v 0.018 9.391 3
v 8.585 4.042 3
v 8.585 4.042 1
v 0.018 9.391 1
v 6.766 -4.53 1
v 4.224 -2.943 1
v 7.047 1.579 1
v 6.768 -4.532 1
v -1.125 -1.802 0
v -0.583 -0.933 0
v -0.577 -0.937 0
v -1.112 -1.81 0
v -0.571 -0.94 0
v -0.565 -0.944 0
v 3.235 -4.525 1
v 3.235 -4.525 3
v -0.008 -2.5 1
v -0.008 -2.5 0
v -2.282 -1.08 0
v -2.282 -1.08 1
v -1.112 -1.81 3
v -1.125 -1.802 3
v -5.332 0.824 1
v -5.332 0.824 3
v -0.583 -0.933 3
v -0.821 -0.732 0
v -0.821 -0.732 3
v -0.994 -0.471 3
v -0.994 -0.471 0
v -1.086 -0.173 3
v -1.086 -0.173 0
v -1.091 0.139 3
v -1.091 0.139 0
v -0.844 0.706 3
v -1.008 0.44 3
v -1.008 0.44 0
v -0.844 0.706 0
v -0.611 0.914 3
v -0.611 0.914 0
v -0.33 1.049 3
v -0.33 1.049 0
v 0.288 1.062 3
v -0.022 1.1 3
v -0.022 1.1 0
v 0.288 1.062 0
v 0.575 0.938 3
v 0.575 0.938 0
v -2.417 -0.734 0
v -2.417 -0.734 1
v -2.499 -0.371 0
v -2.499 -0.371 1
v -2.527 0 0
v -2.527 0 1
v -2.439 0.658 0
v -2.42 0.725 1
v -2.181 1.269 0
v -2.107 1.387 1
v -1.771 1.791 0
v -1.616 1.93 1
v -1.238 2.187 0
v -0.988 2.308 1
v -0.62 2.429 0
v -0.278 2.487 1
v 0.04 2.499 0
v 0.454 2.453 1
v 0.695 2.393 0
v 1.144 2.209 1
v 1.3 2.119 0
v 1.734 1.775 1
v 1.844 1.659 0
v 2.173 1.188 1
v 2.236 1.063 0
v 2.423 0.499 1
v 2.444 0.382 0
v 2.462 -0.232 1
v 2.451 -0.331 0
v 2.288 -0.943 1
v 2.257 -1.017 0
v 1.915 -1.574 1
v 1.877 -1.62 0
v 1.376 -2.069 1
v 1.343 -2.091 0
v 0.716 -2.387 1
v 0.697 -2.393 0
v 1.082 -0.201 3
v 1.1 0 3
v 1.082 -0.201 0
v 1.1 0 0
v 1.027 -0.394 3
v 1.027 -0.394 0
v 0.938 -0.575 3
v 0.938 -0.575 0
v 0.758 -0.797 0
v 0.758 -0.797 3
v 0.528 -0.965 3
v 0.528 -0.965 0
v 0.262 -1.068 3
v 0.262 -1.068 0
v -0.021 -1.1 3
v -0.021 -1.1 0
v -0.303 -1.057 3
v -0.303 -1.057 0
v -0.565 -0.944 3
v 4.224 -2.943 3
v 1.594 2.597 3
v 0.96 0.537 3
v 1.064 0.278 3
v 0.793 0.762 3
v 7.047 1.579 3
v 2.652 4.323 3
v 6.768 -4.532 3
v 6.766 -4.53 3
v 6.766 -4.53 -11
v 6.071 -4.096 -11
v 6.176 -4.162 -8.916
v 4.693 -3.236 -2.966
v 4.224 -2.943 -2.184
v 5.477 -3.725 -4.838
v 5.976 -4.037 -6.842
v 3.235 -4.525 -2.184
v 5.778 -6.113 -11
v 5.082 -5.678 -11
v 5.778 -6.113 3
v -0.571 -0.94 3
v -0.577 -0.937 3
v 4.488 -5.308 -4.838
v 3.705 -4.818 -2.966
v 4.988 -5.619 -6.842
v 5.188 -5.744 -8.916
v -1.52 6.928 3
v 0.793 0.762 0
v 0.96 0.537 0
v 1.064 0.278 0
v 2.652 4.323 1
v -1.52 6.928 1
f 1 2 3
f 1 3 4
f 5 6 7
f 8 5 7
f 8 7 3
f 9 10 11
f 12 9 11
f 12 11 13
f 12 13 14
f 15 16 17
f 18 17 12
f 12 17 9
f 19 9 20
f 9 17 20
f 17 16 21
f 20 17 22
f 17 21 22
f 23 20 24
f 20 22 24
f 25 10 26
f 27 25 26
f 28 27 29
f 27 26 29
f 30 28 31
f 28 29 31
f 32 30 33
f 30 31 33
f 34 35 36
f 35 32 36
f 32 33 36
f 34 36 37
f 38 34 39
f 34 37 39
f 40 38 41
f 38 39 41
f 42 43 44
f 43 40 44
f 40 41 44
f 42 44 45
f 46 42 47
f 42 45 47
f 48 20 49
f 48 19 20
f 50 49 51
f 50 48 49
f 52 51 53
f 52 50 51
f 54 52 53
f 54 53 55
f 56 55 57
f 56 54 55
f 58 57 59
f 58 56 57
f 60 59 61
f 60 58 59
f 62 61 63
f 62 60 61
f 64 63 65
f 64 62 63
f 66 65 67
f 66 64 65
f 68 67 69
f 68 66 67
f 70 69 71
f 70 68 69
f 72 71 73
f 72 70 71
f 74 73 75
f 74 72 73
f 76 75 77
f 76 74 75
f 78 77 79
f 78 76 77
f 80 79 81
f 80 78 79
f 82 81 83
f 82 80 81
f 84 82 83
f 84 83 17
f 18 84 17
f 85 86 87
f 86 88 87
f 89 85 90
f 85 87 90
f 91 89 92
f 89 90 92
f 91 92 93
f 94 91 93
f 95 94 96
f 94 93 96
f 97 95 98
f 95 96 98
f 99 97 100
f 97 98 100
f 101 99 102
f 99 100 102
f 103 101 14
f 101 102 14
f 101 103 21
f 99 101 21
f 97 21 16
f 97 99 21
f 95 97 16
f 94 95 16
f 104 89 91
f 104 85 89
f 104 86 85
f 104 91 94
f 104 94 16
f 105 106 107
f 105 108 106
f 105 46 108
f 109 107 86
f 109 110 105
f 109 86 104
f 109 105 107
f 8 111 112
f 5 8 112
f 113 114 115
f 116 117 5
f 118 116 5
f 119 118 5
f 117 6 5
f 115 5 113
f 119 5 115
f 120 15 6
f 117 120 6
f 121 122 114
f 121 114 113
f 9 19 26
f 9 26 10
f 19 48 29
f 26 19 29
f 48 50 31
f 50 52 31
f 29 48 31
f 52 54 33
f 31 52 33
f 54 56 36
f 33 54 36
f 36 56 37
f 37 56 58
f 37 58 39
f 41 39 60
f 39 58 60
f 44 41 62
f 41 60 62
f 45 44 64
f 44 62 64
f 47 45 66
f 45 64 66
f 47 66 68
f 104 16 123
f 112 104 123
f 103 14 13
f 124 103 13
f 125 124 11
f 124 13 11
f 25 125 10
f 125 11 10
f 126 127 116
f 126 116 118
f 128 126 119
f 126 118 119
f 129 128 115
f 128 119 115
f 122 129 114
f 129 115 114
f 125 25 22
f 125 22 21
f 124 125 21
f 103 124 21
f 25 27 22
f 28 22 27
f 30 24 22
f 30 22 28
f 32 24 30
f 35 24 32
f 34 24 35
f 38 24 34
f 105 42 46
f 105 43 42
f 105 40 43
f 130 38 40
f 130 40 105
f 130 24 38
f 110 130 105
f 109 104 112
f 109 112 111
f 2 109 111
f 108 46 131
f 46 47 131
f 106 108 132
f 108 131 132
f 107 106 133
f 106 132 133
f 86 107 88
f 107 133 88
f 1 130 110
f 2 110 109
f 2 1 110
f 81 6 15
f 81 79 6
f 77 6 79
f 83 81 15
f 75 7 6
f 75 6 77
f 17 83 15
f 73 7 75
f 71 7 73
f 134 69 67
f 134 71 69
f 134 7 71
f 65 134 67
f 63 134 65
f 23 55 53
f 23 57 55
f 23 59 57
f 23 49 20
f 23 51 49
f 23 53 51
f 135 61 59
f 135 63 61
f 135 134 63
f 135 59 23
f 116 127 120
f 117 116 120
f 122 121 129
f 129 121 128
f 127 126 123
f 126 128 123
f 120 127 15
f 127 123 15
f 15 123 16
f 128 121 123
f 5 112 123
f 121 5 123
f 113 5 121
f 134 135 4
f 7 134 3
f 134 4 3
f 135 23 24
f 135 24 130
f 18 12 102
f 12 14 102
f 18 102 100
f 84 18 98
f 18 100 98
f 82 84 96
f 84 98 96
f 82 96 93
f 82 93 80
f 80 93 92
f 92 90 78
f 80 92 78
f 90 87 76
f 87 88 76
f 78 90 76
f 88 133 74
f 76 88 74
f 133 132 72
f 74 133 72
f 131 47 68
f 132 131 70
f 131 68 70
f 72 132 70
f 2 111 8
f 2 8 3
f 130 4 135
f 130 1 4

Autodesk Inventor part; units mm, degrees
ref_plane "YZ Plane" through (0, 0, 0) normal (1, 0, 0) x (0, 1, 0)
ref_plane "XZ Plane" through (0, 0, 0) normal (0, 1, 0) x (-1, 0, 0)
ref_plane "XY Plane" through (0, 0, 0) normal (0, 0, 1) x (1, 0, 0)
sketch "Skizze1" plane through (0, 0, 0) normal (0, 0, 1) x (1, 0, 0)
  circle A0 centre (0, 0) radius 0.5718 construction
  circle A1 centre (0, 0) radius 1.1
  line L0 (-3.4324, -5.4831) -> (-0.3524, -0.608) projected
  line L1 (12.1628, 19.8522) -> (1.5943, 2.5967) projected
  line L2 (0, 0) -> (-2.7013, -4.3259)
  line L3 (0, 0) -> (2.6665, 4.3474)
  line L4 (0, 0) -> (4.3474, -2.6665)
  line L5 (1.6594, -7.0489) -> (-6.9075, -1.6993)
  line L6 (-6.9075, -1.6993) -> (-1.5201, 6.9282)
  line L7 (-1.5201, 6.9282) -> (7.0468, 1.5787)
  line L8 (7.0468, 1.5787) -> (1.6594, -7.0489)
  dimension "d0" = 2.2
  dimension "d1" = 5.1
  dimension "d2" = 5.1
  dimension "d3" = 5.1
  dimension "d4" = 10.1
extrude "Extrusion1" add sketch "Skizze1" along normal blind 3 contours A1 L3 L1 L7 L8 L5 L0 | A1 L2 L5 L6 L7 L1 L3 | A1 L0 L2
sketch "Skizze2" plane through (0, 0, 0) normal (0, 0, -1) x (-1, 0, 0)
  circle A0 centre (0, 0) radius 1.1 projected
  line L0 (-1.6594, -7.0489) -> (6.9075, -1.6993) projected
  line L1 (6.9075, -1.6993) -> (1.5201, 6.9282) projected
  line L2 (1.5201, 6.9282) -> (-7.0468, 1.5787) projected
  line L3 (-7.0468, 1.5787) -> (-1.6594, -7.0489) projected
  circle A1 centre (0, 0) radius 1.1
  circle A2 centre (0.0269, 0) radius 2.5
  dimension "d7" = 5
extrude "Extrusion2" cut sketch "Skizze2" against normal blind 1 contours L3 L2 L1 L0
sketch "Skizze3" plane through (0, 0, 3) normal (0, 0, 1) x (1, 0, 0)
  circle A0 centre (0, 0) radius 1.1 projected
  line L0 (-6.9075, -1.6993) -> (1.6594, -7.0489) projected
  line L1 (1.6594, -7.0489) -> (7.0468, 1.5787) projected
  line L2 (7.0468, 1.5787) -> (-1.5201, 6.9282) projected
  line L3 (-1.5201, 6.9282) -> (-6.9075, -1.6993) projected
  line L4 (-2.6241, -4.3741) -> (-1.1, -1.79)
  line L5 (-6.9075, -1.6993) -> (1.6594, -7.0489)
  line L6 (1.6594, -7.0489) -> (3.2354, -4.5251)
  line L7 (3.2354, -4.5251) -> (-5.3316, 0.8245)
  line L8 (-5.3316, 0.8245) -> (-6.9075, -1.6993)
  dimension "d10" = 3
extrude "Extrusion3" cut sketch "Skizze3" against normal through all contours L3 L7 L4 L0 | L4 L7 L1 L0
sketch "Skizze4" plane through (0, 0, 3) normal (0, 0, 1) x (1, 0, 0)
  line L0 (-5.3316, 0.8245) -> (3.2354, -4.5251) projected
  line L1 (3.2354, -4.5251) -> (7.0468, 1.5787) projected
  line L2 (7.0468, 1.5787) -> (-1.5201, 6.9282) projected
  line L3 (-1.5201, 6.9282) -> (-5.3316, 0.8245) projected
  circle A0 centre (0, 0) radius 1.1 projected
  line L4 (-5.3316, 0.8245) -> (3.2354, -4.5251) projected
  line L5 (-5.3316, 0.8245) -> (3.2354, -4.5251)
  line L6 (3.2354, -4.5251) -> (8.5849, 4.0418)
  line L7 (8.5849, 4.0418) -> (0.018, 9.3914)
  line L8 (0.018, 9.3914) -> (-5.3316, 0.8245)
  dimension "d13" = 10.1
extrude "Extrusion4" add sketch "Skizze4" against normal up to surface (2 mm away) contours L8 L7 L6 L2
sketch "Skizze5" plane through (0, 0, 3) normal (0, 0, 1) x (1, 0, 0)
  line L0 (4.2881, -6.9427) -> (6.1322, -4.0444) projected
  line L1 (5.7598, -3.8294) -> (4.7032, -3.2194) projected
  line L2 (-5.3316, 0.8245) -> (3.2354, -4.5251) projected
  line L3 (3.2354, -4.5251) -> (8.5849, 4.0418) projected
  line L4 (8.5849, 4.0418) -> (0.018, 9.3914) projected
  line L5 (0.018, 9.3914) -> (-5.3316, 0.8245) projected
  circle A0 centre (0, 0) radius 1.1 projected
  line L6 (3.2354, -4.5251) -> (8.5849, 4.0418) projected
  line L7 (3.2354, -4.5251) -> (4.2236, -2.9426)
  line L8 (4.2236, -2.9426) -> (7.6164, -5.0612)
  line L9 (7.6164, -5.0612) -> (6.6282, -6.6437)
  line L10 (6.6282, -6.6437) -> (3.2354, -4.5251)
  dimension "d16" = 4
extrude "Extrusion5" add sketch "Skizze5" against normal blind 14 contours L10 L3 L8 L0 | L0 L8 L9 L10
sketch "Skizze6" plane through (7.6164, -5.0612, 3) normal (0.5296614, 0.8482092, 0) x (0.8482092, -0.5296614, 0)
  line L0 (-1.7975, 12.28) -> (-2.2192, 15.496) projected
  line L1 (-1.9046, 10.7265) -> (-1.9053, 12.2728) projected
  line L2 (-1.9046, 10.7265) -> (-2.6926, 7.736) projected
  line L3 (-2.2272, 9.066) -> (-3.4465, 6.126) projected
  line L4 (-4.252, 5.184) -> (-3.4465, 6.126) projected
  line L5 (-4, 2) -> (-4, 14) projected
  arc A0 (-4, 5.4787) -> (-2.0084, 13.888) centre (-13.8052, 12.2414) ccw construction
  arc A1 (-3.4465, 5.9662) -> (-1.8224, 14) centre (-13.8052, 12.2414) ccw
  line L6 (-4, 14) -> (0, 14) projected
  line L7 (-1.8224, 14) -> (-4, 14)
  line L8 (-4, 14) -> (-4, 5.1324)
  line L9 (-1.9018, 5.1324) -> (-1.8224, 5.1324)
  line L10 (-3.4465, 5.9662) -> (-4, 5.184)
  point P0 (-9.141, 3)
extrude "Extrusion6" cut sketch "Skizze6" against normal through all
sketch "Skizze7" plane through (6.6282, -6.6437, 3) normal (0.8482092, -0.5296614, 0) x (0, 0, -1)
  line L0 (0, 0) -> (0, 1.8657) projected
  line L1 (0, 0) -> (14, 0) projected
  line L2 (14, 1.8657) -> (14, 0) projected
  line L3 (0, 1.8657) -> (14, 1.8657) projected
  point P0 (3, 2.1246)
extrude "Extrusion7" cut sketch "Skizze7" against normal blind 1
sketch "Skizze8" plane through (0, 0, 3) normal (0, 0, 1) x (1, 0, 0)
  circle A0 centre (0, 0) radius 1.1 projected
  line L0 (5.78, -6.1141) -> (6.7682, -4.5315) projected
  line L1 (6.7682, -4.5315) -> (4.2236, -2.9426) projected
  line L2 (4.2236, -2.9426) -> (8.5849, 4.0418) projected
  line L3 (8.5849, 4.0418) -> (0.018, 9.3914) projected
  line L4 (0.018, 9.3914) -> (-5.3316, 0.8245) projected
  line L5 (-5.3316, 0.8245) -> (5.78, -6.1141) projected
  line L6 (6.7682, -4.5315) -> (8.5849, 4.0418)
extrude "Extrusion8" add sketch "Skizze8" against normal up to surface (2 mm away) contours L1 L2 L6
properties part number "thumb_base_plate" material "Nylon 6/6"
